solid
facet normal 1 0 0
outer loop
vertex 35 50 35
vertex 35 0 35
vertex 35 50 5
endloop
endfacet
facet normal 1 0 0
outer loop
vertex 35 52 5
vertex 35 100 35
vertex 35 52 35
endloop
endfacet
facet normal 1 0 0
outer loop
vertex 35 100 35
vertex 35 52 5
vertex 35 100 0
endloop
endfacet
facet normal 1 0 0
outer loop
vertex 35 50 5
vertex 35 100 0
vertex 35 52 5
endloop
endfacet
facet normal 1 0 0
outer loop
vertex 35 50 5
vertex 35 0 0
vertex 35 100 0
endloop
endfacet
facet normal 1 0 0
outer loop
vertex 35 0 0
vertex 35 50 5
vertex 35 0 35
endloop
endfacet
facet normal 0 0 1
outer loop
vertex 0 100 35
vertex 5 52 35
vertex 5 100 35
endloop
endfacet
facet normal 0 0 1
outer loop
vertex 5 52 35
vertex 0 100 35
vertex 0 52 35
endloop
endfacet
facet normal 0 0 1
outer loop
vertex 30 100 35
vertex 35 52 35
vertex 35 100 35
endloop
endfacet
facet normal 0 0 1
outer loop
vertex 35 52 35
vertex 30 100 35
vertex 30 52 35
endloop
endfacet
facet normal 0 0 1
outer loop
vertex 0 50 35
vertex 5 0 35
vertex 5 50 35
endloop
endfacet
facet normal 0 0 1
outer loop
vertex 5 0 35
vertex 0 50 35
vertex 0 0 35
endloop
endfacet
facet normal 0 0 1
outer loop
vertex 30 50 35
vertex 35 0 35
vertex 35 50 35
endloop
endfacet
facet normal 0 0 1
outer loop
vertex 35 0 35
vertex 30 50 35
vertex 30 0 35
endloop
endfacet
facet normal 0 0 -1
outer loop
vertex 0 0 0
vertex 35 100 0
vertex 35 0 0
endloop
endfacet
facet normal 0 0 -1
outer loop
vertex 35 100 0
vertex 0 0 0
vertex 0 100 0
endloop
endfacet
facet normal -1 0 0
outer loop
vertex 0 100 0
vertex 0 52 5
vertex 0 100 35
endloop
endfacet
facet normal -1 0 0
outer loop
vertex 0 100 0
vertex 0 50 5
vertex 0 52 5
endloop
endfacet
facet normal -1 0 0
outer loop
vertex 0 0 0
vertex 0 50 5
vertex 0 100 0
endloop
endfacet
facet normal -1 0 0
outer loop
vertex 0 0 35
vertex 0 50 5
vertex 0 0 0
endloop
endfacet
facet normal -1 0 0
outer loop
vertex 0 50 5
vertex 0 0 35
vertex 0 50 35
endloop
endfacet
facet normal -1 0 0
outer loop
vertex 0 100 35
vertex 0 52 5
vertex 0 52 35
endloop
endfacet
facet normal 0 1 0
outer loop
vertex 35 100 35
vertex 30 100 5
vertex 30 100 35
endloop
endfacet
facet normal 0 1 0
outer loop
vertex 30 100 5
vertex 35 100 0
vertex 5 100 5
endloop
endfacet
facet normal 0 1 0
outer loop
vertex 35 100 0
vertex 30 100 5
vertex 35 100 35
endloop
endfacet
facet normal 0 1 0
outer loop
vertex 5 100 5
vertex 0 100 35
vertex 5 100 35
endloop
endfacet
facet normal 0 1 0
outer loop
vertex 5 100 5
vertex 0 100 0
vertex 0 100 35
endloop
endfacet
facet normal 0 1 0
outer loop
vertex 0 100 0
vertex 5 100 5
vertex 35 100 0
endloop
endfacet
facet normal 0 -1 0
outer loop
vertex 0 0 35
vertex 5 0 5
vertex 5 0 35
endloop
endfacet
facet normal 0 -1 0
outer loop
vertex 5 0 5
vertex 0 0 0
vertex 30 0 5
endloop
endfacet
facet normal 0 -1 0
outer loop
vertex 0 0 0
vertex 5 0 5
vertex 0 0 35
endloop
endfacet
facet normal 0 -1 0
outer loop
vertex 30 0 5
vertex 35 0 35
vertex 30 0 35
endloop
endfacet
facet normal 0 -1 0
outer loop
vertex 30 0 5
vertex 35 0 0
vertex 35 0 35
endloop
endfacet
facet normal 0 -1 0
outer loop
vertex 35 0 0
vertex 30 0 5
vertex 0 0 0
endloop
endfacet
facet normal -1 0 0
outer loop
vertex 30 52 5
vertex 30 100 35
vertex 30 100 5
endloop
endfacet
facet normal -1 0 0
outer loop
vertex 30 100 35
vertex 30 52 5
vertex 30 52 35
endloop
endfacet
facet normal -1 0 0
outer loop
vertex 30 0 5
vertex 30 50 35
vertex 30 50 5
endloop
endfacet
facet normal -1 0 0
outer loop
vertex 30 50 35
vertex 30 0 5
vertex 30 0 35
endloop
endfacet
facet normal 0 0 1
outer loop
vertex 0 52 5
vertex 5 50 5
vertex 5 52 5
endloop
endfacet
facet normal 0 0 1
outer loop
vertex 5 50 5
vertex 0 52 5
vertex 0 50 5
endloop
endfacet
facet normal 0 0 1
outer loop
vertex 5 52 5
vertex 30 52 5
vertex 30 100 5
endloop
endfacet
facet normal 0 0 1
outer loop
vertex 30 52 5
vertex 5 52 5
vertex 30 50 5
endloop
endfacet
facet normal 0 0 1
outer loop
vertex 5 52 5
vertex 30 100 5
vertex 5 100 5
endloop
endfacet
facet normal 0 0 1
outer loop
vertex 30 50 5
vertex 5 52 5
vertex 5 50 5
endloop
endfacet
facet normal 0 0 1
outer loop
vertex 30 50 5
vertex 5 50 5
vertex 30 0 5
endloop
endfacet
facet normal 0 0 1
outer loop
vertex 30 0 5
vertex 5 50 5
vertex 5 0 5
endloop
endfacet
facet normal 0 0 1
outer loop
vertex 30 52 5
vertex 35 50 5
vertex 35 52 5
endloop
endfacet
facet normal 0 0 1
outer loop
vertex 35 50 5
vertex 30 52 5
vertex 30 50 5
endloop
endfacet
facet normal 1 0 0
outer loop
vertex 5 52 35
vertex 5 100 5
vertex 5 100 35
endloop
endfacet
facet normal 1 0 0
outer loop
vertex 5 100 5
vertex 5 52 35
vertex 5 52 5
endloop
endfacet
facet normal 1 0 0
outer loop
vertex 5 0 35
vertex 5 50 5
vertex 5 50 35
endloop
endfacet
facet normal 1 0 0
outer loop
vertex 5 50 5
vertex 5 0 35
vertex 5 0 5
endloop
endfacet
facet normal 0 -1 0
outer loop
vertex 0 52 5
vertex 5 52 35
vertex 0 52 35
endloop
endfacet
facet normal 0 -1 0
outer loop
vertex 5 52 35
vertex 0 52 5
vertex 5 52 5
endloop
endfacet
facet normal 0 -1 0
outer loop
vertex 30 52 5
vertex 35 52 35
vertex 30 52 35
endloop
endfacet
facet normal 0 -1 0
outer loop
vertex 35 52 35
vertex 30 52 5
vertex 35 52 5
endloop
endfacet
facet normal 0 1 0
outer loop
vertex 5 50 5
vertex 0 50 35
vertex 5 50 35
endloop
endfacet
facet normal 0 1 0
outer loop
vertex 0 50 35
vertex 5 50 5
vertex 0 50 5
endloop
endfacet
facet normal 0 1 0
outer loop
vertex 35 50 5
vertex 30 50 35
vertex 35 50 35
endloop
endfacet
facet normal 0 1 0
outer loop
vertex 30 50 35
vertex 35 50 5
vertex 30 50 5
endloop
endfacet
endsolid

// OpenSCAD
inner_height = 30;
inner_width = 25;
depth = 100;
wall_thickness = 5;
blade_thickness = 2;

outer_width = inner_width + wall_thickness*2;
outer_height = inner_height + wall_thickness;

module outer_cube() {
    cube([outer_width, depth, outer_height]);
}

module inner_cube() {
    translate([wall_thickness, 0, wall_thickness]) {
        cube([inner_width, depth, inner_height]);
    }
}

module blade_gap() {
    translate([0, depth/2, wall_thickness]) {
        cube([outer_width, blade_thickness, inner_height]);
    }
}

difference() {
    outer_cube();
    inner_cube();
    blade_gap();
}
